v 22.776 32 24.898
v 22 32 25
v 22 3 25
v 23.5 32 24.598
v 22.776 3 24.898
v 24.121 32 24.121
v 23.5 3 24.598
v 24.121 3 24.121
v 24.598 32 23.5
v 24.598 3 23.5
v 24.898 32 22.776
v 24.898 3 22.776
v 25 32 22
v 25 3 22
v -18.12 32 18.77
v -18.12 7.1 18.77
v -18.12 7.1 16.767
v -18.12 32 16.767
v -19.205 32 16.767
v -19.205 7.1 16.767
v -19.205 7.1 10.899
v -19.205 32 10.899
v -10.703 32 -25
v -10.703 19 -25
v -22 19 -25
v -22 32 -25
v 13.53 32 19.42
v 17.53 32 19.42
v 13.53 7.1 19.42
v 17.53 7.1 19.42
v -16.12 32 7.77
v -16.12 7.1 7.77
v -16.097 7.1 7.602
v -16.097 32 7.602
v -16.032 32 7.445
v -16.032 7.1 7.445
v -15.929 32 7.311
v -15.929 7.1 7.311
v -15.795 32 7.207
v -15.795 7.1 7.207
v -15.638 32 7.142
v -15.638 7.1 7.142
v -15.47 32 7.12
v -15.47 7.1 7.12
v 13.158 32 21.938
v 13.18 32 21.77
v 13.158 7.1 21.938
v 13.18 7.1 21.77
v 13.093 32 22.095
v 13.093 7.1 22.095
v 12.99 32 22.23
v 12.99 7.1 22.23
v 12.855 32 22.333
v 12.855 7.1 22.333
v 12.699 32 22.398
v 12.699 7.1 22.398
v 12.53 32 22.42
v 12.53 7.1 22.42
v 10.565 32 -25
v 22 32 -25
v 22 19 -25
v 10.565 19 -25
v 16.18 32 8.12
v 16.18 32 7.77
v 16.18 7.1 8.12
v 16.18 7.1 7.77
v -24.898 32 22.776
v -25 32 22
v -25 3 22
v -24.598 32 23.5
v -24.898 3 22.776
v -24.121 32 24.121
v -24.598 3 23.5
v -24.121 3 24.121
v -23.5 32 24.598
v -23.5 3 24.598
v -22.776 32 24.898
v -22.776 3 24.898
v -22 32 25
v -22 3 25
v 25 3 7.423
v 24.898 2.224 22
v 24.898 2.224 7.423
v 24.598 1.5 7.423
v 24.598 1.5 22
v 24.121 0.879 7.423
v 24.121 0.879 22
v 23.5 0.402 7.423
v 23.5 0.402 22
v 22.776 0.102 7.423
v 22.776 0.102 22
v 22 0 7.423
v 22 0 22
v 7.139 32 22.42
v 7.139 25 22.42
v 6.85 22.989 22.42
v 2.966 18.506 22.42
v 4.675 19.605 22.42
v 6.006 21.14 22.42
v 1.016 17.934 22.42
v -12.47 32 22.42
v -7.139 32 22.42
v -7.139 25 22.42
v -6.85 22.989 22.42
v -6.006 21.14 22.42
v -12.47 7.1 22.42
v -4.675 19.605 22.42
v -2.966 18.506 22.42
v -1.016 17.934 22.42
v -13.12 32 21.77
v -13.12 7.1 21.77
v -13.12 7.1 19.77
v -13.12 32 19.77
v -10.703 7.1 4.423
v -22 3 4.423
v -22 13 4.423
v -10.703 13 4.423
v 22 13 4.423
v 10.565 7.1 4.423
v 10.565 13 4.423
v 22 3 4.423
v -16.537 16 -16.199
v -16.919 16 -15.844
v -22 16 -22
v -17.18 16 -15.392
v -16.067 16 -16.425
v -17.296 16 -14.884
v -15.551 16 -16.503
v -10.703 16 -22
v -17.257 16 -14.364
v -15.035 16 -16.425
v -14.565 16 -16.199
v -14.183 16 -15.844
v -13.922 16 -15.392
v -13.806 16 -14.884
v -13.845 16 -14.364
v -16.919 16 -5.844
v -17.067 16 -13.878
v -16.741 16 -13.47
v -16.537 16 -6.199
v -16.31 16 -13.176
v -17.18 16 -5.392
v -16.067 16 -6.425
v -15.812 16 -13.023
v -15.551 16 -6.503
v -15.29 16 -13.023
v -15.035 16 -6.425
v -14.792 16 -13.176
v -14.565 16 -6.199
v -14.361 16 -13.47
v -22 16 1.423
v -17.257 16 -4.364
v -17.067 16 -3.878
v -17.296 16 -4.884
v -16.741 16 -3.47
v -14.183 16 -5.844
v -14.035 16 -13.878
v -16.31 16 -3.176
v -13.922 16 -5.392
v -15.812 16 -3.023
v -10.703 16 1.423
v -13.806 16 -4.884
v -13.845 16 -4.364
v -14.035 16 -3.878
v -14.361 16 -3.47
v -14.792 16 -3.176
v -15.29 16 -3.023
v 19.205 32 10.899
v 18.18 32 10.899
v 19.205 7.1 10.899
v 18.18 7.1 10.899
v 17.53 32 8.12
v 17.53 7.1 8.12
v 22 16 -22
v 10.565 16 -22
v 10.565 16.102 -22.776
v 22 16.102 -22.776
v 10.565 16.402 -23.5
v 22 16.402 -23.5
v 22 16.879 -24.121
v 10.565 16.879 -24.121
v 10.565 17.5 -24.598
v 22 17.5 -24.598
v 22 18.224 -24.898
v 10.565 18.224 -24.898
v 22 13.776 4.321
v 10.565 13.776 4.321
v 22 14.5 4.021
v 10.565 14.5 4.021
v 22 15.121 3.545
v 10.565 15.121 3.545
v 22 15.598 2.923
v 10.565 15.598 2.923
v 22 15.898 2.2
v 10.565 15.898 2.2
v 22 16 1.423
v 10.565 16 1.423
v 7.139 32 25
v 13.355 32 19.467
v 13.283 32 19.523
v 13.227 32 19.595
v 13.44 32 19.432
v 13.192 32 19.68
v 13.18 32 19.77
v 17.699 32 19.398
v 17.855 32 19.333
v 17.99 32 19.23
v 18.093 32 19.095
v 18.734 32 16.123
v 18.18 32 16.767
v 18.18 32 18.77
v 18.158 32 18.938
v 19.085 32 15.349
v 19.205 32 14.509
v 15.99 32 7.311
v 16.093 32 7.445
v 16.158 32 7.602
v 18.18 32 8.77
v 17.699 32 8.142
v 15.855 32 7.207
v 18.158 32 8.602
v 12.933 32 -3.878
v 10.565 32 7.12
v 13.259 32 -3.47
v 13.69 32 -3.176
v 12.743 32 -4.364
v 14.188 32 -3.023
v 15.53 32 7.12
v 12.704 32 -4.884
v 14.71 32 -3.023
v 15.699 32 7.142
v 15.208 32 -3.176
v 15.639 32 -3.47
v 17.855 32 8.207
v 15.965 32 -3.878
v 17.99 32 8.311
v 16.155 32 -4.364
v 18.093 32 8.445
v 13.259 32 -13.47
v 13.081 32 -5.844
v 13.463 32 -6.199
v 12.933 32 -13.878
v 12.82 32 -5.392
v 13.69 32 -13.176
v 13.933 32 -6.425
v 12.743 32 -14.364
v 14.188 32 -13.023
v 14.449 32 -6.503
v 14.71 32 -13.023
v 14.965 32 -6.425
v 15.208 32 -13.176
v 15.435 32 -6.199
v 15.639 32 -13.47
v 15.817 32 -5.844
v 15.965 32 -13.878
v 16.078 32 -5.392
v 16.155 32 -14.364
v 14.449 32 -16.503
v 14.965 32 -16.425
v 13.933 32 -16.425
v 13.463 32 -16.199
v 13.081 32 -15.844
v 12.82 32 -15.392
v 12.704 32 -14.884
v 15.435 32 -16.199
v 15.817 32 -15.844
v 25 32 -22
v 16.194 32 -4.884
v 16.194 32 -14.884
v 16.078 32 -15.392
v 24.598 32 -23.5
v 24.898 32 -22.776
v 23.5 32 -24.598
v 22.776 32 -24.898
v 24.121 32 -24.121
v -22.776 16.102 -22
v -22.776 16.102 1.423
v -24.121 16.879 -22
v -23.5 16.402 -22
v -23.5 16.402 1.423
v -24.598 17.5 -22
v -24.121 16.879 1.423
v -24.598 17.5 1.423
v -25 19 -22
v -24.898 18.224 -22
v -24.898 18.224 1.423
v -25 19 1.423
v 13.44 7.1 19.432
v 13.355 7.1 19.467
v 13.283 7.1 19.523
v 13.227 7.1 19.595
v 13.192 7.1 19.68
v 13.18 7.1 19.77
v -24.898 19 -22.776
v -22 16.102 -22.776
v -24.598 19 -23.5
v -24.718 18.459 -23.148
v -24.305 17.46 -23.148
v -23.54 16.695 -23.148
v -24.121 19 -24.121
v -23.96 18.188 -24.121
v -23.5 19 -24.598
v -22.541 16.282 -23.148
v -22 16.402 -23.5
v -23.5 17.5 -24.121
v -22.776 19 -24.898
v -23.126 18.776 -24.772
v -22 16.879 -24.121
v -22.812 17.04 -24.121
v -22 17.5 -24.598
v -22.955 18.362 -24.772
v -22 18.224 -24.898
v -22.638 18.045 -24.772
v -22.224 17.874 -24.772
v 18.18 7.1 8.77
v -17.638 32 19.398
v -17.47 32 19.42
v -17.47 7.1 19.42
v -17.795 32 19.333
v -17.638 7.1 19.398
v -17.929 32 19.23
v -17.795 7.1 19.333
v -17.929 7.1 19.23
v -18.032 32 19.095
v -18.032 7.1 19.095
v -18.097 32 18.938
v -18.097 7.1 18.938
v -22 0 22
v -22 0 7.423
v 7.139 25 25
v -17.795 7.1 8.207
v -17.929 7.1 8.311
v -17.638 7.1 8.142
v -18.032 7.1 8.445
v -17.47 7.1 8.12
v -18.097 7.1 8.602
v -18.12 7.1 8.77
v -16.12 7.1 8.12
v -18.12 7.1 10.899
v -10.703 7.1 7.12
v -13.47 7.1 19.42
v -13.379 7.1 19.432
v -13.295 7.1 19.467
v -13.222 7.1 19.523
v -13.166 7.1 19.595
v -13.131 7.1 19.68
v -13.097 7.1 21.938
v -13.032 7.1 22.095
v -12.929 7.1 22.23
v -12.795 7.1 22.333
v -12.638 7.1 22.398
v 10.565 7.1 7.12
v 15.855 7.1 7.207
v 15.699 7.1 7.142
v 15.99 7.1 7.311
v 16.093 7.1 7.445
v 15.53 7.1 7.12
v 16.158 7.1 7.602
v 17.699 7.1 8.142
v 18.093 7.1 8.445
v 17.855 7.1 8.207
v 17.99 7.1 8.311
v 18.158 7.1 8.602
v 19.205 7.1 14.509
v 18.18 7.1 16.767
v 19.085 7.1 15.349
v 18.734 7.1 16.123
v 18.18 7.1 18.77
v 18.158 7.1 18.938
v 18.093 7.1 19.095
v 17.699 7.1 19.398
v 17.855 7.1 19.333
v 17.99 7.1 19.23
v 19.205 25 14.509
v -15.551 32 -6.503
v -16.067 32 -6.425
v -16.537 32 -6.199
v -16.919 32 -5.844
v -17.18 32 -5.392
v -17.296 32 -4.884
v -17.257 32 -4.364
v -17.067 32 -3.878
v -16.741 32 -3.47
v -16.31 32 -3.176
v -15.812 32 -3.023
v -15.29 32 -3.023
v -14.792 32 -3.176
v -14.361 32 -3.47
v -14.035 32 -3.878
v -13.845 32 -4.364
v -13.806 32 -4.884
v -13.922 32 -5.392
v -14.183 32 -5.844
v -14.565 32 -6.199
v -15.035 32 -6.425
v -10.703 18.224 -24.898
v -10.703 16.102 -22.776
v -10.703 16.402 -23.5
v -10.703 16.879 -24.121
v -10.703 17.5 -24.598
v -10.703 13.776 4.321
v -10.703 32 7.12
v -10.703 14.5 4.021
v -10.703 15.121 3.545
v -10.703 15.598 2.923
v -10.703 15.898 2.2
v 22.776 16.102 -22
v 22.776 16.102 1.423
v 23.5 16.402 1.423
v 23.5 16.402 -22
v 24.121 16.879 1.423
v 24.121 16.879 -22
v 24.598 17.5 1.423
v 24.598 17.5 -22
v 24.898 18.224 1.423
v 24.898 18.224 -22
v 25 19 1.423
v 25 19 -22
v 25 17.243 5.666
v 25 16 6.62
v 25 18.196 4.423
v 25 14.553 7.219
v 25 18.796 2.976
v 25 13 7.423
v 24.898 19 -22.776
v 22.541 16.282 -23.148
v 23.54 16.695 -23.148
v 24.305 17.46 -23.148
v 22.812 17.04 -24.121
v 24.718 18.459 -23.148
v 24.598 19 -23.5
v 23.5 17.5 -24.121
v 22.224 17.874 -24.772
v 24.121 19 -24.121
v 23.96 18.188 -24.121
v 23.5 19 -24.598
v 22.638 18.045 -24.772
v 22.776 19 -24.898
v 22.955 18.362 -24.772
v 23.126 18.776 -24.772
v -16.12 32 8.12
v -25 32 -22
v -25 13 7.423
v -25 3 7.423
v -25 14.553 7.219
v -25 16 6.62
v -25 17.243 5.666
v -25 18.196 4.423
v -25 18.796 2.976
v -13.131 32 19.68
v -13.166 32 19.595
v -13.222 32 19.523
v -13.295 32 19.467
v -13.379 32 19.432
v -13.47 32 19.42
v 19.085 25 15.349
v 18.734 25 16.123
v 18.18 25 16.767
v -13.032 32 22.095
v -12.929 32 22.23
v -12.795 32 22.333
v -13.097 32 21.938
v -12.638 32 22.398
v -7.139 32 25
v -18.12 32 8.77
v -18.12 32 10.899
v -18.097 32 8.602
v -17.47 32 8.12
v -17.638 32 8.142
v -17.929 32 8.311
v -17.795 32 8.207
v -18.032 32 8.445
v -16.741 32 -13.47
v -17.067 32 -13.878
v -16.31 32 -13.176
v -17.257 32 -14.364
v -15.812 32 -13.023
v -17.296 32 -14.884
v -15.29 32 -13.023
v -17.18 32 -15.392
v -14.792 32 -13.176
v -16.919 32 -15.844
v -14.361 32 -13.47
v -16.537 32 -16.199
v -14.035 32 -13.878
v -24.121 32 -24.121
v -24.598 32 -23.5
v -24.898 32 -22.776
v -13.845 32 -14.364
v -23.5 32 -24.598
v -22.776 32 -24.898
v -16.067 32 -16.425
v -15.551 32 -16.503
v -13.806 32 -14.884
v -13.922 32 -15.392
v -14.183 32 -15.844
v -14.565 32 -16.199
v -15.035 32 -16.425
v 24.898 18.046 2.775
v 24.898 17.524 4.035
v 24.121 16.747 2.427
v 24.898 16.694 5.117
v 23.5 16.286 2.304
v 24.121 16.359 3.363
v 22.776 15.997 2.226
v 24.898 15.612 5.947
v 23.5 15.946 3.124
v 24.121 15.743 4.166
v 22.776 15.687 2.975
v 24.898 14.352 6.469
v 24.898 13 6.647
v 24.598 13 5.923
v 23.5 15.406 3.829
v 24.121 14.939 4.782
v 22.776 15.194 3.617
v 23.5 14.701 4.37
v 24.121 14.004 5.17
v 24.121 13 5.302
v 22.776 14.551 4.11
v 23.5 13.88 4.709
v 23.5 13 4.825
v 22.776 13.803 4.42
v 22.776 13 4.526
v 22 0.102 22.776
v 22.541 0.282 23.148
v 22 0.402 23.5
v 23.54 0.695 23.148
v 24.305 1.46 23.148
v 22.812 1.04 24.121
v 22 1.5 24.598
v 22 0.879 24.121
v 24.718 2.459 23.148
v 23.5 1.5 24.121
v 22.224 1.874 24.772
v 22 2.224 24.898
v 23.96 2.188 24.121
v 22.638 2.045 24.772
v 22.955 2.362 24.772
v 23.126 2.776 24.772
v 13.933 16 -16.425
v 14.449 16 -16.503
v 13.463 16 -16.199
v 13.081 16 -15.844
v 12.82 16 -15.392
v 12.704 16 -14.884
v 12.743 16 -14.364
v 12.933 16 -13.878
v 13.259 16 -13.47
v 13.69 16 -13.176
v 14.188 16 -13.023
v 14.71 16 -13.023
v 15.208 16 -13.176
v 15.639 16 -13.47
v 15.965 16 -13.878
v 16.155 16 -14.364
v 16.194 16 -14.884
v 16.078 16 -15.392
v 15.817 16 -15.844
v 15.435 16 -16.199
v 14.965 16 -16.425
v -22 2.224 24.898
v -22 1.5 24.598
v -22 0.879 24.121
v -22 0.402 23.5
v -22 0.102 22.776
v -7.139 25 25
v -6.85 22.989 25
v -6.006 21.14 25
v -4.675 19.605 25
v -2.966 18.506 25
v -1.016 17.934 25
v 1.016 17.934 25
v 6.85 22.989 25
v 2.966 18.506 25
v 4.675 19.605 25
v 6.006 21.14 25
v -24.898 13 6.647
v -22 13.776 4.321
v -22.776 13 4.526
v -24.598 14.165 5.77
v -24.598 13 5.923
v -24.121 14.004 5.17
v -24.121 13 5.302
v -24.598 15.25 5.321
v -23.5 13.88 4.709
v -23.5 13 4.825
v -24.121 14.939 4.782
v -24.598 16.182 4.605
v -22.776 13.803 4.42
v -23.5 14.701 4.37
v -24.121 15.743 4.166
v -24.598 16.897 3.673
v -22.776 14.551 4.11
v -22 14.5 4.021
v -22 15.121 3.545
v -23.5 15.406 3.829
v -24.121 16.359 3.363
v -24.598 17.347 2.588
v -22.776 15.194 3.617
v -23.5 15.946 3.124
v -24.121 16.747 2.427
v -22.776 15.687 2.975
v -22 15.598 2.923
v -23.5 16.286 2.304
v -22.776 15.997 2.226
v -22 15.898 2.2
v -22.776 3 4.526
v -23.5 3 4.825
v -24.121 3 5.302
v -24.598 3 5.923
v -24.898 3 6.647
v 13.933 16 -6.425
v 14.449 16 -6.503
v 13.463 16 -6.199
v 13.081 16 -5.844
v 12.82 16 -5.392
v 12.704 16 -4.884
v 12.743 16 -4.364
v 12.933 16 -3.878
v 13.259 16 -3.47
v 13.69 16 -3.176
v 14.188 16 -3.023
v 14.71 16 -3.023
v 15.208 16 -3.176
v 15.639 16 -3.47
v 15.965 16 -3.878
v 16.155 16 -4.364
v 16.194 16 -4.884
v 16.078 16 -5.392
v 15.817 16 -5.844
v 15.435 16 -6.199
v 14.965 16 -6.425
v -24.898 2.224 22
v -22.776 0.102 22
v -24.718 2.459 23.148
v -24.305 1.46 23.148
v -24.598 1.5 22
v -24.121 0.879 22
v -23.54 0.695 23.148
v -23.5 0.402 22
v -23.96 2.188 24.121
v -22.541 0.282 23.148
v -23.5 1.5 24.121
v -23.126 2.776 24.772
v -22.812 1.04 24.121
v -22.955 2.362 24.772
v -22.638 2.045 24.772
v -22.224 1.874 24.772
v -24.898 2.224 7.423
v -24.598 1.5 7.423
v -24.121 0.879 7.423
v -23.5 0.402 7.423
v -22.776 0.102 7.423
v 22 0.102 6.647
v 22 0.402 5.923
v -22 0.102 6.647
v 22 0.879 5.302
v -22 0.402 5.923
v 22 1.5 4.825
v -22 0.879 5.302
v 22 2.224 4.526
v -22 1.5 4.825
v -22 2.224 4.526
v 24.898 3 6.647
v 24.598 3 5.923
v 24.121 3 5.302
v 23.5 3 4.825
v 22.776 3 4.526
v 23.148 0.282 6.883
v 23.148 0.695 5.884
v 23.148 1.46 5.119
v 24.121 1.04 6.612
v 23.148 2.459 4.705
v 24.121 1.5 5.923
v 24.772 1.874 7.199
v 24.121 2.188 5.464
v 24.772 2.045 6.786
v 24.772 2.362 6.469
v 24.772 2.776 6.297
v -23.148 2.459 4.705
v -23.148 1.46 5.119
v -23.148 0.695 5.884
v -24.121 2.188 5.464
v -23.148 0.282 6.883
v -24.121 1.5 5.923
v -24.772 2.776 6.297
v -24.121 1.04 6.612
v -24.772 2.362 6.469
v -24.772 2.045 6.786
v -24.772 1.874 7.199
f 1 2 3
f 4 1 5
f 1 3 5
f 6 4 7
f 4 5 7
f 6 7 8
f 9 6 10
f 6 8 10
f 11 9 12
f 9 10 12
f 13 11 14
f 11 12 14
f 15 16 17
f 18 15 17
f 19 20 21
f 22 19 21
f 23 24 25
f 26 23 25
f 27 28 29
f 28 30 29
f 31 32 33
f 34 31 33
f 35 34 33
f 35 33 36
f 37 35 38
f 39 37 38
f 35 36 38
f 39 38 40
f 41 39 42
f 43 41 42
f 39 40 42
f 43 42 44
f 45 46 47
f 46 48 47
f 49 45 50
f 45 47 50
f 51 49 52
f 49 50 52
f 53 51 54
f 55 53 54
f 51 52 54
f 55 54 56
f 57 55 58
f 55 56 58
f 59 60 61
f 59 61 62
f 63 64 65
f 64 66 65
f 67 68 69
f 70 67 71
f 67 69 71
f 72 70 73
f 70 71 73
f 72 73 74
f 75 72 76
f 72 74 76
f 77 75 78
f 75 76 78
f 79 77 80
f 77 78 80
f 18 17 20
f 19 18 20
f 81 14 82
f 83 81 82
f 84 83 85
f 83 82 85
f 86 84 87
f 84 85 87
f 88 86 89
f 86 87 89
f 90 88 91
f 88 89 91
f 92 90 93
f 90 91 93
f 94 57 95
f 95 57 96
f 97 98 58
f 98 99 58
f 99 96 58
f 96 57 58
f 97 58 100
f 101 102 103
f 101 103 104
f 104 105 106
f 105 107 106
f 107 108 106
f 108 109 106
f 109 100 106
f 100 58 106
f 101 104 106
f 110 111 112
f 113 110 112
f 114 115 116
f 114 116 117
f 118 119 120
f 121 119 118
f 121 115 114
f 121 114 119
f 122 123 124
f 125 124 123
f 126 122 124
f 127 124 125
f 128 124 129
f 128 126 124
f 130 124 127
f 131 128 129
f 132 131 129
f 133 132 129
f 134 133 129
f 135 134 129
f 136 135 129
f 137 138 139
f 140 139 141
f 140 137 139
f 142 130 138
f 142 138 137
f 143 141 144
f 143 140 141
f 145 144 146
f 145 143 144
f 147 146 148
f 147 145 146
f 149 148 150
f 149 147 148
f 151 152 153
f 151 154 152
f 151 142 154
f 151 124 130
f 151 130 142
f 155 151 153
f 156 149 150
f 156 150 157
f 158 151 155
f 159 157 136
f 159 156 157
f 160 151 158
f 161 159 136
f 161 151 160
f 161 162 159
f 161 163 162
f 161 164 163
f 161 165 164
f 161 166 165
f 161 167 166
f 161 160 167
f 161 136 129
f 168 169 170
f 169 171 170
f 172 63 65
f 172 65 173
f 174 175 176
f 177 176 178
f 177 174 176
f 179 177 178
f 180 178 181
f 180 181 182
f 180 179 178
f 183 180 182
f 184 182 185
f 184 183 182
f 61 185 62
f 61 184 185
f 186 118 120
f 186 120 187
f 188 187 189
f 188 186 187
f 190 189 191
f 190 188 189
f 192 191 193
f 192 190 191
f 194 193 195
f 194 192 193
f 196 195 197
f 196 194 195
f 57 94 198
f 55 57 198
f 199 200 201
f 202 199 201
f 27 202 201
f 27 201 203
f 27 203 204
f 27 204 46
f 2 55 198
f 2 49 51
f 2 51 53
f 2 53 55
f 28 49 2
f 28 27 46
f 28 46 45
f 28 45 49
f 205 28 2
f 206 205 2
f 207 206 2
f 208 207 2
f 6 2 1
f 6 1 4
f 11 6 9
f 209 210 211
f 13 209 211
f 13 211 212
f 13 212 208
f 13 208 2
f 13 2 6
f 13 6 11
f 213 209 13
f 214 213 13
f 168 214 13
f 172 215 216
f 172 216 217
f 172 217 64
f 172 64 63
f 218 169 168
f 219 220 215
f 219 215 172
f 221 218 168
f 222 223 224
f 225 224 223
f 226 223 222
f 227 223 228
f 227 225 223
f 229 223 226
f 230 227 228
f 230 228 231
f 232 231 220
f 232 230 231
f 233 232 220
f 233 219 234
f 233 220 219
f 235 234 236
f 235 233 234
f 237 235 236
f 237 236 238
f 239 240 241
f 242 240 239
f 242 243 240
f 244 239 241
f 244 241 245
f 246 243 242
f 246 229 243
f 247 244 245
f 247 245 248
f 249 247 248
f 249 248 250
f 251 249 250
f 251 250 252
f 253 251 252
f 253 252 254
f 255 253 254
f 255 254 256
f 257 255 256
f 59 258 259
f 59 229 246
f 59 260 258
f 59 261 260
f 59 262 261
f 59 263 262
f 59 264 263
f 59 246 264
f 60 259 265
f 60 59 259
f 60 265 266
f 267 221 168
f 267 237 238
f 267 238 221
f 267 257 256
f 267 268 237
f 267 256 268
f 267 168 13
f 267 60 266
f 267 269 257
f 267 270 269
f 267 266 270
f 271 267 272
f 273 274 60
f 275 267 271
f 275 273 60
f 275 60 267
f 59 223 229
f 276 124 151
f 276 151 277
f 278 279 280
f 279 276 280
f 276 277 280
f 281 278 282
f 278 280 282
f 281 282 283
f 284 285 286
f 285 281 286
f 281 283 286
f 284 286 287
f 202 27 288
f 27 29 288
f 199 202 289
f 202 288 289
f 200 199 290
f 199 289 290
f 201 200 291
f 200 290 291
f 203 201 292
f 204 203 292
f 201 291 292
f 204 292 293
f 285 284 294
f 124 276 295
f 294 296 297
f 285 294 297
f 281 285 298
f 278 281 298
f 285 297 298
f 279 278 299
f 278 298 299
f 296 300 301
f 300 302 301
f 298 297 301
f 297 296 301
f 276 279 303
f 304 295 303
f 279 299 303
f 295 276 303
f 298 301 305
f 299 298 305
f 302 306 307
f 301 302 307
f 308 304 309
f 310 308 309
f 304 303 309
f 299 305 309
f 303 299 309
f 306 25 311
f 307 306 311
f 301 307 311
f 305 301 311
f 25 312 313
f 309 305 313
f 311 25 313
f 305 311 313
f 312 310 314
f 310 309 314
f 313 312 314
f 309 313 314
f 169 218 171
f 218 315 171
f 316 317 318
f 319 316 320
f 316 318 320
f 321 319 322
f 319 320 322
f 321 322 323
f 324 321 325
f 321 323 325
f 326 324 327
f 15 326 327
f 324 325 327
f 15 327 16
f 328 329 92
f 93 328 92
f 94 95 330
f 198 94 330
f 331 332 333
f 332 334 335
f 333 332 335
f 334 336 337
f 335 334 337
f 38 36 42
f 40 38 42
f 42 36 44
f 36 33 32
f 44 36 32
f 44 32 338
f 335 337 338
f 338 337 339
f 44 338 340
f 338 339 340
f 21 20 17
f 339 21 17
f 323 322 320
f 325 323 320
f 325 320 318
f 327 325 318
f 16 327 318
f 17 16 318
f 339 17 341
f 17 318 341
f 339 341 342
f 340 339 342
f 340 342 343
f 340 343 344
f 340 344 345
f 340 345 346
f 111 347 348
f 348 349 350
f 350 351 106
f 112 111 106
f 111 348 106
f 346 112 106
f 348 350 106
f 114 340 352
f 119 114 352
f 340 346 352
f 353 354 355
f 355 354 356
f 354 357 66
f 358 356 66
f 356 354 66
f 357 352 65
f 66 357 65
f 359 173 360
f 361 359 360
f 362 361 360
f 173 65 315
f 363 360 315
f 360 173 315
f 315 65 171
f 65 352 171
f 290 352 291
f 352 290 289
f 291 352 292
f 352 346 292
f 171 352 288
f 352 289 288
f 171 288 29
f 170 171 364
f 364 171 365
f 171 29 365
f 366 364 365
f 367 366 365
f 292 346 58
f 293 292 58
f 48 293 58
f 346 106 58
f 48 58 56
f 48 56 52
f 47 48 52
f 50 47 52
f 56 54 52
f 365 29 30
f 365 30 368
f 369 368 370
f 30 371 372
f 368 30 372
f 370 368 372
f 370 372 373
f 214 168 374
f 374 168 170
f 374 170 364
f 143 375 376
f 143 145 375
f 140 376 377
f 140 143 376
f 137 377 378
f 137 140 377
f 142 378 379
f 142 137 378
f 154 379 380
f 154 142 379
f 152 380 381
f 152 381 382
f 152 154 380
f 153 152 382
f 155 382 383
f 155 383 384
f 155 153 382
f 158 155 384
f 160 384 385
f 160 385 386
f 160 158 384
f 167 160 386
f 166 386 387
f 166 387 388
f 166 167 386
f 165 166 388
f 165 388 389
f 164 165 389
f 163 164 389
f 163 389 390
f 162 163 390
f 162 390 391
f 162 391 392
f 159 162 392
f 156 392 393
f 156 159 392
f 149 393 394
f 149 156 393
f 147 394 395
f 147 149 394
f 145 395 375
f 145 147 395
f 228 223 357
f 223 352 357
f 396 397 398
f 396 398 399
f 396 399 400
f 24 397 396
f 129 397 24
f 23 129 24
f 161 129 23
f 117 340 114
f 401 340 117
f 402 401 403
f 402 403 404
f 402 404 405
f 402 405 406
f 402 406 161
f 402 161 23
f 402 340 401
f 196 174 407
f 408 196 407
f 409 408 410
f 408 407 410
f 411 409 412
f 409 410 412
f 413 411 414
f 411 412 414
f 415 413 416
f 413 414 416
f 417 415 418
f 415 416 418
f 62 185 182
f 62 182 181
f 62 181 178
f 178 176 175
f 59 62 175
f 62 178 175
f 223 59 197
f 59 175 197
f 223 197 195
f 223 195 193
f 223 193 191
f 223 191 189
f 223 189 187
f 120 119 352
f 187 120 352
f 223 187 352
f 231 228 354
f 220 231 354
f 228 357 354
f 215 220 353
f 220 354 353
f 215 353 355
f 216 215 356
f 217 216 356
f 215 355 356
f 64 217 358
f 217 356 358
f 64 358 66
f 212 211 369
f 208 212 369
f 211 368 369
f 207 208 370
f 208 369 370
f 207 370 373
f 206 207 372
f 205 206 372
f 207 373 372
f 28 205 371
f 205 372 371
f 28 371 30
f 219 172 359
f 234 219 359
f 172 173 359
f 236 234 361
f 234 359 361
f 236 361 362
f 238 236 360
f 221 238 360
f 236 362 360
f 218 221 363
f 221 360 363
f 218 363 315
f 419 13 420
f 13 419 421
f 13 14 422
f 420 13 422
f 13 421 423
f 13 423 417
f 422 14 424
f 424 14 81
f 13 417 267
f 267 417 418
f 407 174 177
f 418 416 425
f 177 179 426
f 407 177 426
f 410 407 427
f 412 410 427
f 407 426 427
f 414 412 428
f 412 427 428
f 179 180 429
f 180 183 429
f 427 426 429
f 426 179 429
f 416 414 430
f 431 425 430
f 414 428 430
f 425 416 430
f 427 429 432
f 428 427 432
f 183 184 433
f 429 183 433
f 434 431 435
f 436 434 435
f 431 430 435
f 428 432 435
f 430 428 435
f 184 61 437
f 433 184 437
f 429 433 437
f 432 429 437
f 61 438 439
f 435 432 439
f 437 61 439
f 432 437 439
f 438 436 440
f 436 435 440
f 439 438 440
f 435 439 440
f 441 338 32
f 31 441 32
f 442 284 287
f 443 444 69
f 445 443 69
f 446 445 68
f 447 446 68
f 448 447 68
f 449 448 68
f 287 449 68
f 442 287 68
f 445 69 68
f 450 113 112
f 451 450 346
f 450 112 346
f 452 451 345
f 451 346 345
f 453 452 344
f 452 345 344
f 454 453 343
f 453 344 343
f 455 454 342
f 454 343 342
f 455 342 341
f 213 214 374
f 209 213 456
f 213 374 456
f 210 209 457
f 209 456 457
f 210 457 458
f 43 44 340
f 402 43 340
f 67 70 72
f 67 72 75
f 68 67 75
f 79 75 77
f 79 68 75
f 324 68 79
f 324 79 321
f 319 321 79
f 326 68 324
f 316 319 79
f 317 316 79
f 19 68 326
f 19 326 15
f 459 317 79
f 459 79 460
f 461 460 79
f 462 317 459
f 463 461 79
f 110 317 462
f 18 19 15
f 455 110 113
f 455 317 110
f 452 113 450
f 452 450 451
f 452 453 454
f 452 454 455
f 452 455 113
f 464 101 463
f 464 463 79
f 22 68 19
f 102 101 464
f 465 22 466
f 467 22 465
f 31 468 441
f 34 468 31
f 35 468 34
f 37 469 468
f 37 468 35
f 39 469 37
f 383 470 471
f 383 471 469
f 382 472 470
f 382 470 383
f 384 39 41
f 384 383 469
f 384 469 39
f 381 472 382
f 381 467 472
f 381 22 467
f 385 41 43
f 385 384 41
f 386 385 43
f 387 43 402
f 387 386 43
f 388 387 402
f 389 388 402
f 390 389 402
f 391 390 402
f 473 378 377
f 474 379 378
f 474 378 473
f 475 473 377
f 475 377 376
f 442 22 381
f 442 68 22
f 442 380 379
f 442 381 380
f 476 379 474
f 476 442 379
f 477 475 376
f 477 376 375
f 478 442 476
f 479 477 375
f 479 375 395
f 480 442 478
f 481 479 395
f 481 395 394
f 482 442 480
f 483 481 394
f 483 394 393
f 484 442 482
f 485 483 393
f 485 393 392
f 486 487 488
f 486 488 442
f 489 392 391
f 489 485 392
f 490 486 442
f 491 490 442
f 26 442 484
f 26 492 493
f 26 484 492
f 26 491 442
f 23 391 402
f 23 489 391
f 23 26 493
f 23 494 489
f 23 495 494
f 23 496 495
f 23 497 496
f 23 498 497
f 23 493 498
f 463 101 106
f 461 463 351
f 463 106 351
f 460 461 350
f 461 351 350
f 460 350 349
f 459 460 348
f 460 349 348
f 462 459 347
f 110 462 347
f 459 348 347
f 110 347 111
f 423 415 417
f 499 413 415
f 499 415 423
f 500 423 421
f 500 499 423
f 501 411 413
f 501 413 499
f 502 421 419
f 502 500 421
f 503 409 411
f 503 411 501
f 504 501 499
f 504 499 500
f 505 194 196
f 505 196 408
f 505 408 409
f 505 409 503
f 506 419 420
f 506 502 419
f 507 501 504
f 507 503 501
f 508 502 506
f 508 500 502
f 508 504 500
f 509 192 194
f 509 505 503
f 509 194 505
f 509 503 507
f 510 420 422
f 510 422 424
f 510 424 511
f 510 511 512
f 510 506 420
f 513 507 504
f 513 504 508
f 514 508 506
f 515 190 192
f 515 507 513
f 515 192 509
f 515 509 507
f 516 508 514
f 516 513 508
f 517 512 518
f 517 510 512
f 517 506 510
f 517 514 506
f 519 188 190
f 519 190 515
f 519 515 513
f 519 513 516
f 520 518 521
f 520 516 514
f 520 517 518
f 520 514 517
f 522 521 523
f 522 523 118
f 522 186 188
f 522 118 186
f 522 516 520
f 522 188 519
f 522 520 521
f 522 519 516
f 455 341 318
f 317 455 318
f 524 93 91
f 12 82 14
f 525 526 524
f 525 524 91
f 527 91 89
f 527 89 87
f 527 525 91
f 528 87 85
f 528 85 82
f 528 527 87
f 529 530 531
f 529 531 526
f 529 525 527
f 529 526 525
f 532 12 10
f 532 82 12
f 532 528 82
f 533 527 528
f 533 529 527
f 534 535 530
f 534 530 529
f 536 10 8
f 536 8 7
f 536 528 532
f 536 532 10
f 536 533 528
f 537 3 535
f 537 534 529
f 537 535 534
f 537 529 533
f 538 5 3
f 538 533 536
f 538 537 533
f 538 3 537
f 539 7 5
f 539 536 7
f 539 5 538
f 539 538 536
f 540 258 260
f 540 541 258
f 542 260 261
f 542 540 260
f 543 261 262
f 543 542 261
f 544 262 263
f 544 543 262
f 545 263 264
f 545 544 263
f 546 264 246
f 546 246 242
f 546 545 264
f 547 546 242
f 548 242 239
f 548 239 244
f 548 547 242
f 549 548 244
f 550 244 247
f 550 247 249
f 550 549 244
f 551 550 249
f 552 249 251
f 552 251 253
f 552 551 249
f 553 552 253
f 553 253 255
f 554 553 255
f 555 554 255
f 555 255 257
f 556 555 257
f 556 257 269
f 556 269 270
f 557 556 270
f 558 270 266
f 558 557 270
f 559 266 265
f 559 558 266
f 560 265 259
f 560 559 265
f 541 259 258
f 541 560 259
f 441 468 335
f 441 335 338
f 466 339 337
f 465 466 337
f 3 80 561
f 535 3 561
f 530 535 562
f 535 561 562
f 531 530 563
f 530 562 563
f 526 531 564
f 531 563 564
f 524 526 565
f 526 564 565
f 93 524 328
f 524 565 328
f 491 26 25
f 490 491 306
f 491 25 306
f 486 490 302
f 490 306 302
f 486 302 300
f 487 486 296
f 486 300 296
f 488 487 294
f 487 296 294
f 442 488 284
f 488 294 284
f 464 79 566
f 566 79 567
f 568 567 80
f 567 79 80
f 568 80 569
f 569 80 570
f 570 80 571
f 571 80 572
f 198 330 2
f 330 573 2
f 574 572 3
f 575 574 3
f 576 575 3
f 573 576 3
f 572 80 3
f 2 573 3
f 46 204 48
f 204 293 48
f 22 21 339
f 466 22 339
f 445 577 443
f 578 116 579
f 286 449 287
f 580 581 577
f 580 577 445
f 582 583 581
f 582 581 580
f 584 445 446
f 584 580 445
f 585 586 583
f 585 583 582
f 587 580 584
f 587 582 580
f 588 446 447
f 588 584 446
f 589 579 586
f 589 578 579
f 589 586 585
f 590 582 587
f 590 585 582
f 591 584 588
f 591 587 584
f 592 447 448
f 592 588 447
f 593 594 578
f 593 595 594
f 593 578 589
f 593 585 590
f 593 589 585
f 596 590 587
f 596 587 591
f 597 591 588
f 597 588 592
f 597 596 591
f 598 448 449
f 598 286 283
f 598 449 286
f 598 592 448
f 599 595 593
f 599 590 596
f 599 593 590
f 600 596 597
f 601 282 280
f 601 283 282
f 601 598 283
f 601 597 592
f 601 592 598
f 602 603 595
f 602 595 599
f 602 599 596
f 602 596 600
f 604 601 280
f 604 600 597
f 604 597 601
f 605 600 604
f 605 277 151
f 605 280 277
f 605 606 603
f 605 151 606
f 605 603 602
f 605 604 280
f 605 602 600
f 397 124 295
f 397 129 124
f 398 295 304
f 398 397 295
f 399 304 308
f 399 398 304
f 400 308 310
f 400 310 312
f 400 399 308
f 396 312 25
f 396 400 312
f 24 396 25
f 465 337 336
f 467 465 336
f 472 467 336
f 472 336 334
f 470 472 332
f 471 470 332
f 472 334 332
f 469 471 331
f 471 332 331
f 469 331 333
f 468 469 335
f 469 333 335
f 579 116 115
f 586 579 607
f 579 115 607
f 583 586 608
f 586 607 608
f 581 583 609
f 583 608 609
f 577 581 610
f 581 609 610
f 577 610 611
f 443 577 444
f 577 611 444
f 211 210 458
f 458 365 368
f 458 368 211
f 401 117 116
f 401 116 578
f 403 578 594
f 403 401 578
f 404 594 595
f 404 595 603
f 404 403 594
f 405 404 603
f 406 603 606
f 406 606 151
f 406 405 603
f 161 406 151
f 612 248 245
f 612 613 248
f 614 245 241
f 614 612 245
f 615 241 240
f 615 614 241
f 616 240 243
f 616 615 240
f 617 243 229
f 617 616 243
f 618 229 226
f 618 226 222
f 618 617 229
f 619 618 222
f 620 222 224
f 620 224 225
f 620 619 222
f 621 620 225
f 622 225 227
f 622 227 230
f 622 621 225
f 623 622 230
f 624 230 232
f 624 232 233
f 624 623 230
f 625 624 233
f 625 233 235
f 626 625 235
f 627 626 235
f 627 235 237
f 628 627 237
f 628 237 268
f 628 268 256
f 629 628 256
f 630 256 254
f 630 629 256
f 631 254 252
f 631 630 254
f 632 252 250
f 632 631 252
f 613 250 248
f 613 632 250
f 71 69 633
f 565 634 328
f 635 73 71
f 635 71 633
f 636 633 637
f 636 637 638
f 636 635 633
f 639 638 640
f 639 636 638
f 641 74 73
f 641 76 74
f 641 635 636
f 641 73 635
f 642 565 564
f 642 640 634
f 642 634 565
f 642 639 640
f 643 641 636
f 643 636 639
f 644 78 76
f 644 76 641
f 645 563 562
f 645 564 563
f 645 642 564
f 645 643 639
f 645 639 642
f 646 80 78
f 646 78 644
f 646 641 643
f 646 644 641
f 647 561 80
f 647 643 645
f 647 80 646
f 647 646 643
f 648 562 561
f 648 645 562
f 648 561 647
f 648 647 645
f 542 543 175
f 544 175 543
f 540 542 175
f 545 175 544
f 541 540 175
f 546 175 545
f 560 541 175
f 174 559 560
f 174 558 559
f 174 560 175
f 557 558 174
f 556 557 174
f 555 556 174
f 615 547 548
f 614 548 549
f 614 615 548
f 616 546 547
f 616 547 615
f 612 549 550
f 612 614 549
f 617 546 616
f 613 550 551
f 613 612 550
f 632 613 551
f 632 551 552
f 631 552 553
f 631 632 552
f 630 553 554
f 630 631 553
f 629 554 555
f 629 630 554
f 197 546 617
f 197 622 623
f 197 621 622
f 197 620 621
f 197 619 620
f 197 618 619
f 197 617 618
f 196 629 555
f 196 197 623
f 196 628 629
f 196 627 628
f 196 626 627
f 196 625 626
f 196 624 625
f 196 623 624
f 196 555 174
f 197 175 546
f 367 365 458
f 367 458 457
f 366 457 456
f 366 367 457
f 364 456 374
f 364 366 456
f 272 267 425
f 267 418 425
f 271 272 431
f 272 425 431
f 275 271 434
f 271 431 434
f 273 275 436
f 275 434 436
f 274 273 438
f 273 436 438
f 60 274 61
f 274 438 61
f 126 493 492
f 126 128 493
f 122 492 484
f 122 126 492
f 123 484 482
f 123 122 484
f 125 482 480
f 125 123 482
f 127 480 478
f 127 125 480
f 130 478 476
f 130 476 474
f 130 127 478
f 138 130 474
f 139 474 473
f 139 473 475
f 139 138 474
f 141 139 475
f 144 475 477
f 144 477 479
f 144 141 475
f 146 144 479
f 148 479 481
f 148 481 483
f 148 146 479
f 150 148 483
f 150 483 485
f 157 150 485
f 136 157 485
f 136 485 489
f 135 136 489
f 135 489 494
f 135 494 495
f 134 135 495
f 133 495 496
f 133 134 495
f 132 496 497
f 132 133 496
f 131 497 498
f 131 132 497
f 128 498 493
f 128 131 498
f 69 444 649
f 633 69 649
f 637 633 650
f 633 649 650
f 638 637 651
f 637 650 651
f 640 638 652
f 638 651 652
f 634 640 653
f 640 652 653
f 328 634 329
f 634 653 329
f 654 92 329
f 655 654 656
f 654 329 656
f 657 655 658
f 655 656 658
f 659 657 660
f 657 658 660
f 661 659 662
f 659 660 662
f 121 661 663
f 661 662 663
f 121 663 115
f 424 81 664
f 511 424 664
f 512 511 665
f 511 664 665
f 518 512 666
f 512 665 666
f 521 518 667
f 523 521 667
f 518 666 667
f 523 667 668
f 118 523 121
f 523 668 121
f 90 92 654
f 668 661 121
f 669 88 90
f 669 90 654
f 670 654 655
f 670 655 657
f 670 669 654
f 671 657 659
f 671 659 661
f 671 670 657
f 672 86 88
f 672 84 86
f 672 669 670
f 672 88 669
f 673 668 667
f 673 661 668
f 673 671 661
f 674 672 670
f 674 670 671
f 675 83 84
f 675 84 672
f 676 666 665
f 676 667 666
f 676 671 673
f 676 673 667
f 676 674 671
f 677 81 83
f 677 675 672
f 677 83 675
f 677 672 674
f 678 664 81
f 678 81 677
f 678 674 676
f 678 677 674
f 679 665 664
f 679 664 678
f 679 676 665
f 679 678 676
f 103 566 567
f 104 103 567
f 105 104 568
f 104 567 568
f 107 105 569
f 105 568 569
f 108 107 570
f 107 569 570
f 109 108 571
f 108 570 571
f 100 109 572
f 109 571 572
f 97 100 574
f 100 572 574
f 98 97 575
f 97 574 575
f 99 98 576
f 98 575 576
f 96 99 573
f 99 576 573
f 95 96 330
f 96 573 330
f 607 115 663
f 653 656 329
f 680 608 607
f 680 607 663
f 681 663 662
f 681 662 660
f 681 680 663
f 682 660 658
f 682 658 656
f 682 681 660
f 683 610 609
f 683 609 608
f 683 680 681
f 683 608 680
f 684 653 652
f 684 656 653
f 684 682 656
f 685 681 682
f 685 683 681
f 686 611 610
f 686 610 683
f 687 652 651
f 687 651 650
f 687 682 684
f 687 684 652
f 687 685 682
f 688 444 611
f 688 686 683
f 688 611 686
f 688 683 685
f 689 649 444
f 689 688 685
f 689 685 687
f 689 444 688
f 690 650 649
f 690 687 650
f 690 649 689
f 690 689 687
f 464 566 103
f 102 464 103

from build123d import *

# Parameters (mm, degrees)
EXTRUDE_1_DEPTH     = 25
CUT_EXTRUDE_1_DEPTH = 10
SKETCH_5_W          = 41.777974616
SKETCH_5_H          = 18.894782553
EXTRUDE_4_DEPTH     = 7.1
SKETCH_6_R          = 1.75
CUT_EXTRUDE_2_DEPTH = 44.301270189
CUT_EXTRUDE_3_DEPTH = 16
FILLET_1_R          = 3
FILLET_3_R          = 3
EXTRUDE_5_DEPTH     = 7
CUT_EXTRUDE_START   = -17
SKETCH_11_R         = 1.75
CUT_EXTRUDE_4_DEPTH = 17
SKETCH_10_R         = 1.75
CUT_EXTRUDE_5_DEPTH = 17


with BuildPart() as part:
    # 草图1 → 凸台-拉伸1 (new body)
    with BuildSketch(Plane(origin=(0, 0, 0), x_dir=(1, 0, 0), z_dir=(0, 1, 0))):
        with BuildLine():
            Line((-25, -25), (25, -25))
            Line((25, -25), (25, 25))
            Line((25, 25), (12.530461135, 25))
            Line((12.530461135, 25), (10.564896285, 25))
            Line((10.564896285, 25), (10.564896285, -7.120248206))
            Line((10.564896285, -7.120248206), (12.530461135, -7.120248206))
            Line((12.530461135, -7.120248206), (15.530461135, -7.120248206))
            ThreePointArc((15.530461135, -7.120248206), (15.990080543, -7.310628798), (16.180461135, -7.770248206))
            Line((16.180461135, -7.770248206), (16.180461135, -8.120248206))
            Line((16.180461135, -8.120248206), (17.530461135, -8.120248206))
            ThreePointArc((17.530461135, -8.120248206), (17.990080543, -8.310628798), (18.180461135, -8.770248206))
            Line((18.180461135, -8.770248206), (18.180461135, -10.898803743))
            Line((18.180461135, -10.898803743), (19.204850948, -10.898803743))
            Line((19.204850948, -10.898803743), (19.204850948, -16.766546625))
            Line((19.204850948, -16.766546625), (18.180461135, -16.766546625))
            Line((18.180461135, -16.766546625), (18.180461135, -18.770248206))
            ThreePointArc((18.180461135, -18.770248206), (17.990080543, -19.229867614), (17.530461135, -19.420248206))
            Line((17.530461135, -19.420248206), (13.530461135, -19.420248206))
            ThreePointArc((13.530461135, -19.420248206), (13.282973762, -19.522760833), (13.180461135, -19.770248206))
            Line((13.180461135, -19.770248206), (13.180461135, -21.770248206))
            ThreePointArc((13.180461135, -21.770248206), (12.990080543, -22.229867614), (12.530461135, -22.420248206))
            Line((12.530461135, -22.420248206), (-12.469538865, -22.420248206))
            ThreePointArc((-12.469538865, -22.420248206), (-12.929158272, -22.229867614), (-13.119538865, -21.770248206))
            Line((-13.119538865, -21.770248206), (-13.119538865, -19.770248206))
            ThreePointArc((-13.119538865, -19.770248206), (-13.222051491, -19.522760833), (-13.469538865, -19.420248206))
            Line((-13.469538865, -19.420248206), (-17.469538865, -19.420248206))
            ThreePointArc((-17.469538865, -19.420248206), (-17.929158272, -19.229867614), (-18.119538865, -18.770248206))
            Line((-18.119538865, -18.770248206), (-18.119538865, -16.766546625))
            Line((-18.119538865, -16.766546625), (-18.180461135, -16.766546625))
            Line((-18.180461135, -16.766546625), (-19.204850948, -16.766546625))
            Line((-19.204850948, -16.766546625), (-19.204850948, -10.898803743))
            Line((-19.204850948, -10.898803743), (-18.180461135, -10.898803743))
            Line((-18.180461135, -10.898803743), (-18.119538865, -10.898803743))
            Line((-18.119538865, -10.898803743), (-18.119538865, -8.770248206))
            ThreePointArc((-18.119538865, -8.770248206), (-17.929158272, -8.310628798), (-17.469538865, -8.120248206))
            Line((-17.469538865, -8.120248206), (-16.119538865, -8.120248206))
            Line((-16.119538865, -8.120248206), (-16.119538865, -7.770248206))
            ThreePointArc((-16.119538865, -7.770248206), (-15.929158272, -7.310628798), (-15.469538865, -7.120248206))
            Line((-15.469538865, -7.120248206), (-14.200297417, -7.120248206))
            Line((-14.200297417, -7.120248206), (-10.70316973, -7.120248206))
            Line((-10.70316973, -7.120248206), (-10.70316973, 25))
            Line((-10.70316973, 25), (-11.261897063, 25))
            Line((-11.261897063, 25), (-25, 25))
            Line((-25, 25), (-25, -25))
        make_face()
    extrude(amount=EXTRUDE_1_DEPTH)

    # 草图2 → 切除-拉伸1 (cut)
    with BuildSketch(Plane.XY.offset(25)):
        with BuildLine():
            Line((7.139013901, 25), (-7.139013901, 25))
            ThreePointArc((-7.139013901, 25), (0, 17.860986099), (7.139013901, 25))
        make_face()
    extrude(amount=-CUT_EXTRUDE_1_DEPTH, mode=Mode.SUBTRACT)

    # 草图5 → 凸台-拉伸4 (add)
    with BuildSketch(Plane.XZ):
        with Locations((0, 13.870801672)):
            Rectangle(SKETCH_5_W, SKETCH_5_H)
    extrude(amount=-EXTRUDE_4_DEPTH)

    # 草图6 → 切除-拉伸2 (cut, through all)
    with BuildSketch(Plane.XZ):
        with Locations(Location((-15.550997874, -4.753034163, 0), (0, 0, 270))):
            Circle(SKETCH_6_R)
        with Locations(Location((-15.550997874, -14.753034163, 0), (0, 0, 270))):
            Circle(SKETCH_6_R)
        with Locations(Location((14.449002126, -4.753034163, 0), (0, 0, 270))):
            Circle(SKETCH_6_R)
        with Locations(Location((14.449002126, -14.753034163, 0), (0, 0, 270))):
            Circle(SKETCH_6_R)
    extrude(amount=-CUT_EXTRUDE_2_DEPTH, mode=Mode.SUBTRACT)

    # 草图7 → 切除-拉伸3 (cut)
    with BuildSketch(Plane.XZ):
        Polygon((-10.70316973, 4.423410395), (-25, 4.423410395), (-25, -26.3625), (26.927678364, -26.3625), (26.927678364, 4.423410395), align=None)
    extrude(amount=-CUT_EXTRUDE_3_DEPTH, mode=Mode.SUBTRACT)

    # 圆角1
    # the kernel refuses this fillet: 3 mm, written as the material it adds along each edge
    with BuildSketch(Plane(origin=(19.204850948, 1.455885595, 16.766546625), x_dir=(0, 0, -1), z_dir=(0, 1, 0))) as fillet_1_piece_1:
        with BuildLine():
            CenterArc((2.257645762, 3), FILLET_1_R, 221.188370699, 48.811629301)
            Line((0, 1.024389812), (0, 0))
            Line((0, 0), (2.257645762, 0))
        make_face()
    extrude(amount=23.544114405)
    with BuildSketch(Plane(origin=(25, 16, 4.423410395), x_dir=(0, 0, -1), z_dir=(-1, 0, 0))) as fillet_1_piece_2:
        with BuildLine():
            CenterArc((FILLET_1_R, FILLET_1_R), FILLET_1_R, 180, 90)
            Line((0, FILLET_1_R), (0, 0))
            Line((0, 0), (FILLET_1_R, 0))
        make_face()
    extrude(amount=14.435103715)
    with BuildSketch(Plane(origin=(-10.70316973, 16, 4.423410395), x_dir=(0, -1, 0), z_dir=(-1, 0, 0))) as fillet_1_piece_3:
        with BuildLine():
            CenterArc((FILLET_1_R, -FILLET_1_R), FILLET_1_R, 90, 90)
            Line((0, -FILLET_1_R), (0, 0))
            Line((0, 0), (FILLET_1_R, 0))
        make_face()
    extrude(amount=14.29683027)
    # the kernel refuses this fillet: 3 mm, written as the material it takes off along each edge
    with BuildSketch(Plane(origin=(-22, 3, 22), x_dir=(0, -1, 0), z_dir=(0, 0, 1))) as fillet_1_2_piece_1_section:
        Polygon((0, 0), (FILLET_1_R * 1.02, 0), (FILLET_1_R * 1.02, -FILLET_1_R * 1.02), (0, -FILLET_1_R * 1.02), align=None)
    fillet_1_2_piece_1 = extrude(amount=FILLET_1_R * 1.02, mode=Mode.PRIVATE)
    fillet_1_2_piece_1 = fillet_1_2_piece_1 - Plane(origin=(-22, 3, 22), x_dir=(0.7071067811865475, 0.7071067811865475, 0), z_dir=(0, 0, 1)) * Sphere(FILLET_1_R, mode=Mode.PRIVATE)
    add(fillet_1_2_piece_1, mode=Mode.SUBTRACT)
    with BuildSketch(Plane(origin=(22, 3, 22), x_dir=(0, -1, 0), z_dir=(0, 0, 1))) as fillet_1_2_piece_2_section:
        Polygon((0, 0), (FILLET_1_R * 1.02, 0), (FILLET_1_R * 1.02, FILLET_1_R * 1.02), (0, FILLET_1_R * 1.02), align=None)
    fillet_1_2_piece_2 = extrude(amount=FILLET_1_R * 1.02, mode=Mode.PRIVATE)
    fillet_1_2_piece_2 = fillet_1_2_piece_2 - Plane(origin=(22, 3, 22), x_dir=(-0.7071067811865475, 0.7071067811865475, 0), z_dir=(0, 0, 1)) * Sphere(FILLET_1_R, mode=Mode.PRIVATE)
    add(fillet_1_2_piece_2, mode=Mode.SUBTRACT)
    with BuildSketch(Plane(origin=(-22, 0, 25), x_dir=(0, 1, 0), z_dir=(1, 0, 0))) as fillet_1_2_piece_3:
        with BuildLine():
            CenterArc((FILLET_1_R, -FILLET_1_R), FILLET_1_R, 90, 90)
            Line((0, -FILLET_1_R), (0, 0))
            Line((0, 0), (FILLET_1_R, 0))
        make_face()
    extrude(amount=44, mode=Mode.SUBTRACT)
    with BuildSketch(Plane(origin=(25, 0, 22), x_dir=(-1, 0, 0), z_dir=(0, 0, -1)), Plane(origin=(-25, 0, -3.076589605), x_dir=(1, 0, 0), z_dir=(0, 0, 1))) as fillet_1_2_piece_4:
        with BuildLine():
            CenterArc((FILLET_1_R, FILLET_1_R), FILLET_1_R, 180, 90)
            Line((0, FILLET_1_R), (0, 0))
            Line((0, 0), (FILLET_1_R, 0))
        make_face()
    extrude(amount=25.076589605, mode=Mode.SUBTRACT)
    with BuildSketch(Plane(origin=(-32.5, 0, 4.423410395), x_dir=(0, 0, 1), z_dir=(1, 0, 0))) as fillet_1_2_piece_5:
        with BuildLine():
            CenterArc((FILLET_1_R, -FILLET_1_R), FILLET_1_R, 90, 90)
            Line((0, -FILLET_1_R), (0, 0))
            Line((0, 0), (FILLET_1_R, 0))
        make_face()
    extrude(amount=65, mode=Mode.SUBTRACT)
    with BuildSketch(Plane(origin=(25, 3, 25), x_dir=(-1, 0, 0), z_dir=(0, 1, 0))) as fillet_1_2_piece_6:
        with BuildLine():
            CenterArc((FILLET_1_R, -FILLET_1_R), FILLET_1_R, 90, 90)
            Line((0, -FILLET_1_R), (0, 0))
            Line((0, 0), (FILLET_1_R, 0))
        make_face()
    extrude(amount=29.5, mode=Mode.SUBTRACT)
    with BuildSketch(Plane(origin=(-25, 3, 25), x_dir=(1, 0, 0), z_dir=(0, 1, 0))) as fillet_1_2_piece_7:
        with BuildLine():
            CenterArc((FILLET_1_R, FILLET_1_R), FILLET_1_R, 180, 90)
            Line((0, FILLET_1_R), (0, 0))
            Line((0, 0), (FILLET_1_R, 0))
        make_face()
    extrude(amount=29.5, mode=Mode.SUBTRACT)
    # the kernel refuses this fillet: 3 mm, written as the material it takes off along each edge
    with BuildSketch(Plane(origin=(-22, 3, 7.423410395), x_dir=(0, 0, -1), z_dir=(-1, 0, 0))) as fillet_1_3_piece_1_section:
        Polygon((0, 0), (FILLET_1_R * 1.02, 0), (FILLET_1_R * 1.02, FILLET_1_R * 1.02), (0, FILLET_1_R * 1.02), align=None)
    fillet_1_3_piece_1 = extrude(amount=FILLET_1_R * 1.02, mode=Mode.PRIVATE)
    fillet_1_3_piece_1 = fillet_1_3_piece_1 - Plane(origin=(-22, 3, 7.423410395), x_dir=(0, 0.7071067811865475, 0.7071067811865475), z_dir=(-1, 0, 0)) * Sphere(FILLET_1_R, mode=Mode.PRIVATE)
    add(fillet_1_3_piece_1, mode=Mode.SUBTRACT)
    with BuildSketch(Plane(origin=(22, 3, 7.423410395), x_dir=(0, 0, -1), z_dir=(1, 0, 0))) as fillet_1_3_piece_2_section:
        Polygon((0, 0), (FILLET_1_R * 1.02, 0), (FILLET_1_R * 1.02, -FILLET_1_R * 1.02), (0, -FILLET_1_R * 1.02), align=None)
    fillet_1_3_piece_2 = extrude(amount=FILLET_1_R * 1.02, mode=Mode.PRIVATE)
    fillet_1_3_piece_2 = fillet_1_3_piece_2 - Plane(origin=(22, 3, 7.423410395), x_dir=(0, 0.7071067811865475, 0.7071067811865475), z_dir=(1, 0, 0)) * Sphere(FILLET_1_R, mode=Mode.PRIVATE)
    add(fillet_1_3_piece_2, mode=Mode.SUBTRACT)
    with BuildSketch(Plane(origin=(25, 16, -32.5), x_dir=(0, 1, 0), z_dir=(0, 0, 1)), Plane(origin=(-25, 16, 1.423410395), x_dir=(0, 1, 0), z_dir=(0, 0, -1))) as fillet_1_3_piece_3:
        with BuildLine():
            CenterArc((FILLET_1_R, FILLET_1_R), FILLET_1_R, 180, 90)
            Line((0, FILLET_1_R), (0, 0))
            Line((0, 0), (FILLET_1_R, 0))
        make_face()
    extrude(amount=33.923410395, mode=Mode.SUBTRACT)
    with BuildSketch(Plane(origin=(25, 3, 4.423410395), x_dir=(0, 0, 1), z_dir=(0, 1, 0))) as fillet_1_3_piece_4:
        with BuildLine():
            CenterArc((FILLET_1_R, -FILLET_1_R), FILLET_1_R, 90, 90)
            Line((0, -FILLET_1_R), (0, 0))
            Line((0, 0), (FILLET_1_R, 0))
        make_face()
    extrude(amount=10, mode=Mode.SUBTRACT)
    with BuildSketch(Plane(origin=(-25, 3, 4.423410395), x_dir=(0, 0, 1), z_dir=(0, 1, 0))) as fillet_1_3_piece_5:
        with BuildLine():
            CenterArc((FILLET_1_R, FILLET_1_R), FILLET_1_R, 180, 90)
            Line((0, FILLET_1_R), (0, 0))
            Line((0, 0), (FILLET_1_R, 0))
        make_face()
    extrude(amount=10, mode=Mode.SUBTRACT)
    with BuildSketch(Plane(origin=(-25, 13, 1.423410395), x_dir=(0, 0, 1), z_dir=(0, -1, 0))) as fillet_1_3_piece_6:
        with BuildLine():
            CenterArc((3 + FILLET_1_R, -FILLET_1_R), FILLET_1_R, 90, 90)
            Line((3, -FILLET_1_R), (3, 0))
            Line((3, 0), (3 + FILLET_1_R, 0))
        make_face()
    revolve(axis=Axis((-25, 13, 1.423410395), (-1, 0, 0)), revolution_arc=90, mode=Mode.SUBTRACT)
    with BuildSketch(Plane(origin=(25, 13, 1.423410395), x_dir=(0, 1, 0), z_dir=(0, 0, -1))) as fillet_1_3_piece_7:
        with BuildLine():
            CenterArc((3 + FILLET_1_R, -FILLET_1_R), FILLET_1_R, 90, 90)
            Line((3, -FILLET_1_R), (3, 0))
            Line((3, 0), (3 + FILLET_1_R, 0))
        make_face()
    revolve(axis=Axis((25, 13, 1.423410395), (1, 0, 0)), revolution_arc=90, mode=Mode.SUBTRACT)

    # 圆角3
    fillet_3_edges = [part.edges().sort_by_distance(p)[0] for p in [
        (16.282448142, 16, -25),
        (24.121320344, 16.878679656, -25),
        (-16.351584865, 16, -25),
        (-24.121320344, 16.878679656, -25),
        (25, 22, -25),
        (-25, 22, -25),
    ]]
    fillet(fillet_3_edges, radius=FILLET_3_R)

    # 草图8 → 凸台-拉伸5 (add)
    with BuildSketch(Plane(origin=(0, 25, 0), x_dir=(1, 0, 0), z_dir=(0, 1, 0))):
        with BuildLine():
            Line((25, -22), (25, 22))
            ThreePointArc((25, 22), (24.121320344, 24.121320344), (22, 25))
            Line((22, 25), (10.564896285, 25))
            Line((10.564896285, 25), (10.564896285, -7.120248206))
            Line((10.564896285, -7.120248206), (15.530461135, -7.120248206))
            ThreePointArc((15.530461135, -7.120248206), (15.990080543, -7.310628798), (16.180461135, -7.770248206))
            Line((16.180461135, -7.770248206), (16.180461135, -8.120248206))
            Line((16.180461135, -8.120248206), (17.530461135, -8.120248206))
            ThreePointArc((17.530461135, -8.120248206), (17.990080543, -8.310628798), (18.180461135, -8.770248206))
            Line((18.180461135, -8.770248206), (18.180461135, -10.898803743))
            Line((18.180461135, -10.898803743), (19.204850948, -10.898803743))
            Line((19.204850948, -10.898803743), (19.204850948, -14.508900863))
            ThreePointArc((19.204850948, -14.508900863), (18.936776145, -15.748491407), (18.180461135, -16.766546625))
            Line((18.180461135, -16.766546625), (18.180461135, -18.770248206))
            ThreePointArc((18.180461135, -18.770248206), (17.990080543, -19.229867614), (17.530461135, -19.420248206))
            Line((17.530461135, -19.420248206), (13.530461135, -19.420248206))
            ThreePointArc((13.530461135, -19.420248206), (13.282973762, -19.522760833), (13.180461135, -19.770248206))
            Line((13.180461135, -19.770248206), (13.180461135, -21.770248206))
            ThreePointArc((13.180461135, -21.770248206), (12.990080543, -22.229867614), (12.530461135, -22.420248206))
            Line((12.530461135, -22.420248206), (7.139013901, -22.420248206))
            Line((7.139013901, -22.420248206), (7.139013901, -25))
            Line((7.139013901, -25), (22, -25))
            ThreePointArc((22, -25), (24.121320344, -24.121320344), (25, -22))
        make_face()
        with BuildLine():
            Line((-10.70316973, 25), (-22, 25))
            ThreePointArc((-22, 25), (-24.121320344, 24.121320344), (-25, 22))
            Line((-25, 22), (-25, -22))
            ThreePointArc((-25, -22), (-24.121320344, -24.121320344), (-22, -25))
            Line((-22, -25), (-7.139013901, -25))
            Line((-7.139013901, -25), (-7.139013901, -22.420248206))
            Line((-7.139013901, -22.420248206), (-12.469538865, -22.420248206))
            ThreePointArc((-12.469538865, -22.420248206), (-12.929158272, -22.229867614), (-13.119538865, -21.770248206))
            Line((-13.119538865, -21.770248206), (-13.119538865, -19.770248206))
            ThreePointArc((-13.119538865, -19.770248206), (-13.222051491, -19.522760833), (-13.469538865, -19.420248206))
            Line((-13.469538865, -19.420248206), (-17.469538865, -19.420248206))
            ThreePointArc((-17.469538865, -19.420248206), (-17.929158272, -19.229867614), (-18.119538865, -18.770248206))
            Line((-18.119538865, -18.770248206), (-18.119538865, -16.766546625))
            Line((-18.119538865, -16.766546625), (-19.204850948, -16.766546625))
            Line((-19.204850948, -16.766546625), (-19.204850948, -10.898803743))
            Line((-19.204850948, -10.898803743), (-18.119538865, -10.898803743))
            Line((-18.119538865, -10.898803743), (-18.119538865, -8.770248206))
            ThreePointArc((-18.119538865, -8.770248206), (-17.929158272, -8.310628798), (-17.469538865, -8.120248206))
            Line((-17.469538865, -8.120248206), (-16.119538865, -8.120248206))
            Line((-16.119538865, -8.120248206), (-16.119538865, -7.770248206))
            ThreePointArc((-16.119538865, -7.770248206), (-15.929158272, -7.310628798), (-15.469538865, -7.120248206))
            Line((-15.469538865, -7.120248206), (-10.70316973, -7.120248206))
            Line((-10.70316973, -7.120248206), (-10.70316973, 25))
        make_face()
    extrude(amount=EXTRUDE_5_DEPTH)

    # 草图11 → 切除-拉伸4 (cut)
    with BuildSketch(Plane(origin=(0, 32, 0), x_dir=(1, 0, 0), z_dir=(0, 1, 0)).offset(CUT_EXTRUDE_START)):
        with Locations(Location((14.449002126, 4.753034163, 0), (0, 0, 90))):
            Circle(SKETCH_11_R)
        with Locations(Location((14.449002126, 14.753034163, 0), (0, 0, 90))):
            Circle(SKETCH_11_R)
    extrude(amount=CUT_EXTRUDE_4_DEPTH, mode=Mode.SUBTRACT)

    # 草图10 → 切除-拉伸5 (cut)
    with BuildSketch(Plane(origin=(0, 32, 0), x_dir=(1, 0, 0), z_dir=(0, 1, 0)).offset(CUT_EXTRUDE_START)):
        with Locations(Location((-15.550997874, 4.753034163, 0), (0, 0, 90))):
            Circle(SKETCH_10_R)
        with Locations(Location((-15.550997874, 14.753034163, 0), (0, 0, 90))):
            Circle(SKETCH_10_R)
    extrude(amount=CUT_EXTRUDE_5_DEPTH, mode=Mode.SUBTRACT)


solid = part.part
